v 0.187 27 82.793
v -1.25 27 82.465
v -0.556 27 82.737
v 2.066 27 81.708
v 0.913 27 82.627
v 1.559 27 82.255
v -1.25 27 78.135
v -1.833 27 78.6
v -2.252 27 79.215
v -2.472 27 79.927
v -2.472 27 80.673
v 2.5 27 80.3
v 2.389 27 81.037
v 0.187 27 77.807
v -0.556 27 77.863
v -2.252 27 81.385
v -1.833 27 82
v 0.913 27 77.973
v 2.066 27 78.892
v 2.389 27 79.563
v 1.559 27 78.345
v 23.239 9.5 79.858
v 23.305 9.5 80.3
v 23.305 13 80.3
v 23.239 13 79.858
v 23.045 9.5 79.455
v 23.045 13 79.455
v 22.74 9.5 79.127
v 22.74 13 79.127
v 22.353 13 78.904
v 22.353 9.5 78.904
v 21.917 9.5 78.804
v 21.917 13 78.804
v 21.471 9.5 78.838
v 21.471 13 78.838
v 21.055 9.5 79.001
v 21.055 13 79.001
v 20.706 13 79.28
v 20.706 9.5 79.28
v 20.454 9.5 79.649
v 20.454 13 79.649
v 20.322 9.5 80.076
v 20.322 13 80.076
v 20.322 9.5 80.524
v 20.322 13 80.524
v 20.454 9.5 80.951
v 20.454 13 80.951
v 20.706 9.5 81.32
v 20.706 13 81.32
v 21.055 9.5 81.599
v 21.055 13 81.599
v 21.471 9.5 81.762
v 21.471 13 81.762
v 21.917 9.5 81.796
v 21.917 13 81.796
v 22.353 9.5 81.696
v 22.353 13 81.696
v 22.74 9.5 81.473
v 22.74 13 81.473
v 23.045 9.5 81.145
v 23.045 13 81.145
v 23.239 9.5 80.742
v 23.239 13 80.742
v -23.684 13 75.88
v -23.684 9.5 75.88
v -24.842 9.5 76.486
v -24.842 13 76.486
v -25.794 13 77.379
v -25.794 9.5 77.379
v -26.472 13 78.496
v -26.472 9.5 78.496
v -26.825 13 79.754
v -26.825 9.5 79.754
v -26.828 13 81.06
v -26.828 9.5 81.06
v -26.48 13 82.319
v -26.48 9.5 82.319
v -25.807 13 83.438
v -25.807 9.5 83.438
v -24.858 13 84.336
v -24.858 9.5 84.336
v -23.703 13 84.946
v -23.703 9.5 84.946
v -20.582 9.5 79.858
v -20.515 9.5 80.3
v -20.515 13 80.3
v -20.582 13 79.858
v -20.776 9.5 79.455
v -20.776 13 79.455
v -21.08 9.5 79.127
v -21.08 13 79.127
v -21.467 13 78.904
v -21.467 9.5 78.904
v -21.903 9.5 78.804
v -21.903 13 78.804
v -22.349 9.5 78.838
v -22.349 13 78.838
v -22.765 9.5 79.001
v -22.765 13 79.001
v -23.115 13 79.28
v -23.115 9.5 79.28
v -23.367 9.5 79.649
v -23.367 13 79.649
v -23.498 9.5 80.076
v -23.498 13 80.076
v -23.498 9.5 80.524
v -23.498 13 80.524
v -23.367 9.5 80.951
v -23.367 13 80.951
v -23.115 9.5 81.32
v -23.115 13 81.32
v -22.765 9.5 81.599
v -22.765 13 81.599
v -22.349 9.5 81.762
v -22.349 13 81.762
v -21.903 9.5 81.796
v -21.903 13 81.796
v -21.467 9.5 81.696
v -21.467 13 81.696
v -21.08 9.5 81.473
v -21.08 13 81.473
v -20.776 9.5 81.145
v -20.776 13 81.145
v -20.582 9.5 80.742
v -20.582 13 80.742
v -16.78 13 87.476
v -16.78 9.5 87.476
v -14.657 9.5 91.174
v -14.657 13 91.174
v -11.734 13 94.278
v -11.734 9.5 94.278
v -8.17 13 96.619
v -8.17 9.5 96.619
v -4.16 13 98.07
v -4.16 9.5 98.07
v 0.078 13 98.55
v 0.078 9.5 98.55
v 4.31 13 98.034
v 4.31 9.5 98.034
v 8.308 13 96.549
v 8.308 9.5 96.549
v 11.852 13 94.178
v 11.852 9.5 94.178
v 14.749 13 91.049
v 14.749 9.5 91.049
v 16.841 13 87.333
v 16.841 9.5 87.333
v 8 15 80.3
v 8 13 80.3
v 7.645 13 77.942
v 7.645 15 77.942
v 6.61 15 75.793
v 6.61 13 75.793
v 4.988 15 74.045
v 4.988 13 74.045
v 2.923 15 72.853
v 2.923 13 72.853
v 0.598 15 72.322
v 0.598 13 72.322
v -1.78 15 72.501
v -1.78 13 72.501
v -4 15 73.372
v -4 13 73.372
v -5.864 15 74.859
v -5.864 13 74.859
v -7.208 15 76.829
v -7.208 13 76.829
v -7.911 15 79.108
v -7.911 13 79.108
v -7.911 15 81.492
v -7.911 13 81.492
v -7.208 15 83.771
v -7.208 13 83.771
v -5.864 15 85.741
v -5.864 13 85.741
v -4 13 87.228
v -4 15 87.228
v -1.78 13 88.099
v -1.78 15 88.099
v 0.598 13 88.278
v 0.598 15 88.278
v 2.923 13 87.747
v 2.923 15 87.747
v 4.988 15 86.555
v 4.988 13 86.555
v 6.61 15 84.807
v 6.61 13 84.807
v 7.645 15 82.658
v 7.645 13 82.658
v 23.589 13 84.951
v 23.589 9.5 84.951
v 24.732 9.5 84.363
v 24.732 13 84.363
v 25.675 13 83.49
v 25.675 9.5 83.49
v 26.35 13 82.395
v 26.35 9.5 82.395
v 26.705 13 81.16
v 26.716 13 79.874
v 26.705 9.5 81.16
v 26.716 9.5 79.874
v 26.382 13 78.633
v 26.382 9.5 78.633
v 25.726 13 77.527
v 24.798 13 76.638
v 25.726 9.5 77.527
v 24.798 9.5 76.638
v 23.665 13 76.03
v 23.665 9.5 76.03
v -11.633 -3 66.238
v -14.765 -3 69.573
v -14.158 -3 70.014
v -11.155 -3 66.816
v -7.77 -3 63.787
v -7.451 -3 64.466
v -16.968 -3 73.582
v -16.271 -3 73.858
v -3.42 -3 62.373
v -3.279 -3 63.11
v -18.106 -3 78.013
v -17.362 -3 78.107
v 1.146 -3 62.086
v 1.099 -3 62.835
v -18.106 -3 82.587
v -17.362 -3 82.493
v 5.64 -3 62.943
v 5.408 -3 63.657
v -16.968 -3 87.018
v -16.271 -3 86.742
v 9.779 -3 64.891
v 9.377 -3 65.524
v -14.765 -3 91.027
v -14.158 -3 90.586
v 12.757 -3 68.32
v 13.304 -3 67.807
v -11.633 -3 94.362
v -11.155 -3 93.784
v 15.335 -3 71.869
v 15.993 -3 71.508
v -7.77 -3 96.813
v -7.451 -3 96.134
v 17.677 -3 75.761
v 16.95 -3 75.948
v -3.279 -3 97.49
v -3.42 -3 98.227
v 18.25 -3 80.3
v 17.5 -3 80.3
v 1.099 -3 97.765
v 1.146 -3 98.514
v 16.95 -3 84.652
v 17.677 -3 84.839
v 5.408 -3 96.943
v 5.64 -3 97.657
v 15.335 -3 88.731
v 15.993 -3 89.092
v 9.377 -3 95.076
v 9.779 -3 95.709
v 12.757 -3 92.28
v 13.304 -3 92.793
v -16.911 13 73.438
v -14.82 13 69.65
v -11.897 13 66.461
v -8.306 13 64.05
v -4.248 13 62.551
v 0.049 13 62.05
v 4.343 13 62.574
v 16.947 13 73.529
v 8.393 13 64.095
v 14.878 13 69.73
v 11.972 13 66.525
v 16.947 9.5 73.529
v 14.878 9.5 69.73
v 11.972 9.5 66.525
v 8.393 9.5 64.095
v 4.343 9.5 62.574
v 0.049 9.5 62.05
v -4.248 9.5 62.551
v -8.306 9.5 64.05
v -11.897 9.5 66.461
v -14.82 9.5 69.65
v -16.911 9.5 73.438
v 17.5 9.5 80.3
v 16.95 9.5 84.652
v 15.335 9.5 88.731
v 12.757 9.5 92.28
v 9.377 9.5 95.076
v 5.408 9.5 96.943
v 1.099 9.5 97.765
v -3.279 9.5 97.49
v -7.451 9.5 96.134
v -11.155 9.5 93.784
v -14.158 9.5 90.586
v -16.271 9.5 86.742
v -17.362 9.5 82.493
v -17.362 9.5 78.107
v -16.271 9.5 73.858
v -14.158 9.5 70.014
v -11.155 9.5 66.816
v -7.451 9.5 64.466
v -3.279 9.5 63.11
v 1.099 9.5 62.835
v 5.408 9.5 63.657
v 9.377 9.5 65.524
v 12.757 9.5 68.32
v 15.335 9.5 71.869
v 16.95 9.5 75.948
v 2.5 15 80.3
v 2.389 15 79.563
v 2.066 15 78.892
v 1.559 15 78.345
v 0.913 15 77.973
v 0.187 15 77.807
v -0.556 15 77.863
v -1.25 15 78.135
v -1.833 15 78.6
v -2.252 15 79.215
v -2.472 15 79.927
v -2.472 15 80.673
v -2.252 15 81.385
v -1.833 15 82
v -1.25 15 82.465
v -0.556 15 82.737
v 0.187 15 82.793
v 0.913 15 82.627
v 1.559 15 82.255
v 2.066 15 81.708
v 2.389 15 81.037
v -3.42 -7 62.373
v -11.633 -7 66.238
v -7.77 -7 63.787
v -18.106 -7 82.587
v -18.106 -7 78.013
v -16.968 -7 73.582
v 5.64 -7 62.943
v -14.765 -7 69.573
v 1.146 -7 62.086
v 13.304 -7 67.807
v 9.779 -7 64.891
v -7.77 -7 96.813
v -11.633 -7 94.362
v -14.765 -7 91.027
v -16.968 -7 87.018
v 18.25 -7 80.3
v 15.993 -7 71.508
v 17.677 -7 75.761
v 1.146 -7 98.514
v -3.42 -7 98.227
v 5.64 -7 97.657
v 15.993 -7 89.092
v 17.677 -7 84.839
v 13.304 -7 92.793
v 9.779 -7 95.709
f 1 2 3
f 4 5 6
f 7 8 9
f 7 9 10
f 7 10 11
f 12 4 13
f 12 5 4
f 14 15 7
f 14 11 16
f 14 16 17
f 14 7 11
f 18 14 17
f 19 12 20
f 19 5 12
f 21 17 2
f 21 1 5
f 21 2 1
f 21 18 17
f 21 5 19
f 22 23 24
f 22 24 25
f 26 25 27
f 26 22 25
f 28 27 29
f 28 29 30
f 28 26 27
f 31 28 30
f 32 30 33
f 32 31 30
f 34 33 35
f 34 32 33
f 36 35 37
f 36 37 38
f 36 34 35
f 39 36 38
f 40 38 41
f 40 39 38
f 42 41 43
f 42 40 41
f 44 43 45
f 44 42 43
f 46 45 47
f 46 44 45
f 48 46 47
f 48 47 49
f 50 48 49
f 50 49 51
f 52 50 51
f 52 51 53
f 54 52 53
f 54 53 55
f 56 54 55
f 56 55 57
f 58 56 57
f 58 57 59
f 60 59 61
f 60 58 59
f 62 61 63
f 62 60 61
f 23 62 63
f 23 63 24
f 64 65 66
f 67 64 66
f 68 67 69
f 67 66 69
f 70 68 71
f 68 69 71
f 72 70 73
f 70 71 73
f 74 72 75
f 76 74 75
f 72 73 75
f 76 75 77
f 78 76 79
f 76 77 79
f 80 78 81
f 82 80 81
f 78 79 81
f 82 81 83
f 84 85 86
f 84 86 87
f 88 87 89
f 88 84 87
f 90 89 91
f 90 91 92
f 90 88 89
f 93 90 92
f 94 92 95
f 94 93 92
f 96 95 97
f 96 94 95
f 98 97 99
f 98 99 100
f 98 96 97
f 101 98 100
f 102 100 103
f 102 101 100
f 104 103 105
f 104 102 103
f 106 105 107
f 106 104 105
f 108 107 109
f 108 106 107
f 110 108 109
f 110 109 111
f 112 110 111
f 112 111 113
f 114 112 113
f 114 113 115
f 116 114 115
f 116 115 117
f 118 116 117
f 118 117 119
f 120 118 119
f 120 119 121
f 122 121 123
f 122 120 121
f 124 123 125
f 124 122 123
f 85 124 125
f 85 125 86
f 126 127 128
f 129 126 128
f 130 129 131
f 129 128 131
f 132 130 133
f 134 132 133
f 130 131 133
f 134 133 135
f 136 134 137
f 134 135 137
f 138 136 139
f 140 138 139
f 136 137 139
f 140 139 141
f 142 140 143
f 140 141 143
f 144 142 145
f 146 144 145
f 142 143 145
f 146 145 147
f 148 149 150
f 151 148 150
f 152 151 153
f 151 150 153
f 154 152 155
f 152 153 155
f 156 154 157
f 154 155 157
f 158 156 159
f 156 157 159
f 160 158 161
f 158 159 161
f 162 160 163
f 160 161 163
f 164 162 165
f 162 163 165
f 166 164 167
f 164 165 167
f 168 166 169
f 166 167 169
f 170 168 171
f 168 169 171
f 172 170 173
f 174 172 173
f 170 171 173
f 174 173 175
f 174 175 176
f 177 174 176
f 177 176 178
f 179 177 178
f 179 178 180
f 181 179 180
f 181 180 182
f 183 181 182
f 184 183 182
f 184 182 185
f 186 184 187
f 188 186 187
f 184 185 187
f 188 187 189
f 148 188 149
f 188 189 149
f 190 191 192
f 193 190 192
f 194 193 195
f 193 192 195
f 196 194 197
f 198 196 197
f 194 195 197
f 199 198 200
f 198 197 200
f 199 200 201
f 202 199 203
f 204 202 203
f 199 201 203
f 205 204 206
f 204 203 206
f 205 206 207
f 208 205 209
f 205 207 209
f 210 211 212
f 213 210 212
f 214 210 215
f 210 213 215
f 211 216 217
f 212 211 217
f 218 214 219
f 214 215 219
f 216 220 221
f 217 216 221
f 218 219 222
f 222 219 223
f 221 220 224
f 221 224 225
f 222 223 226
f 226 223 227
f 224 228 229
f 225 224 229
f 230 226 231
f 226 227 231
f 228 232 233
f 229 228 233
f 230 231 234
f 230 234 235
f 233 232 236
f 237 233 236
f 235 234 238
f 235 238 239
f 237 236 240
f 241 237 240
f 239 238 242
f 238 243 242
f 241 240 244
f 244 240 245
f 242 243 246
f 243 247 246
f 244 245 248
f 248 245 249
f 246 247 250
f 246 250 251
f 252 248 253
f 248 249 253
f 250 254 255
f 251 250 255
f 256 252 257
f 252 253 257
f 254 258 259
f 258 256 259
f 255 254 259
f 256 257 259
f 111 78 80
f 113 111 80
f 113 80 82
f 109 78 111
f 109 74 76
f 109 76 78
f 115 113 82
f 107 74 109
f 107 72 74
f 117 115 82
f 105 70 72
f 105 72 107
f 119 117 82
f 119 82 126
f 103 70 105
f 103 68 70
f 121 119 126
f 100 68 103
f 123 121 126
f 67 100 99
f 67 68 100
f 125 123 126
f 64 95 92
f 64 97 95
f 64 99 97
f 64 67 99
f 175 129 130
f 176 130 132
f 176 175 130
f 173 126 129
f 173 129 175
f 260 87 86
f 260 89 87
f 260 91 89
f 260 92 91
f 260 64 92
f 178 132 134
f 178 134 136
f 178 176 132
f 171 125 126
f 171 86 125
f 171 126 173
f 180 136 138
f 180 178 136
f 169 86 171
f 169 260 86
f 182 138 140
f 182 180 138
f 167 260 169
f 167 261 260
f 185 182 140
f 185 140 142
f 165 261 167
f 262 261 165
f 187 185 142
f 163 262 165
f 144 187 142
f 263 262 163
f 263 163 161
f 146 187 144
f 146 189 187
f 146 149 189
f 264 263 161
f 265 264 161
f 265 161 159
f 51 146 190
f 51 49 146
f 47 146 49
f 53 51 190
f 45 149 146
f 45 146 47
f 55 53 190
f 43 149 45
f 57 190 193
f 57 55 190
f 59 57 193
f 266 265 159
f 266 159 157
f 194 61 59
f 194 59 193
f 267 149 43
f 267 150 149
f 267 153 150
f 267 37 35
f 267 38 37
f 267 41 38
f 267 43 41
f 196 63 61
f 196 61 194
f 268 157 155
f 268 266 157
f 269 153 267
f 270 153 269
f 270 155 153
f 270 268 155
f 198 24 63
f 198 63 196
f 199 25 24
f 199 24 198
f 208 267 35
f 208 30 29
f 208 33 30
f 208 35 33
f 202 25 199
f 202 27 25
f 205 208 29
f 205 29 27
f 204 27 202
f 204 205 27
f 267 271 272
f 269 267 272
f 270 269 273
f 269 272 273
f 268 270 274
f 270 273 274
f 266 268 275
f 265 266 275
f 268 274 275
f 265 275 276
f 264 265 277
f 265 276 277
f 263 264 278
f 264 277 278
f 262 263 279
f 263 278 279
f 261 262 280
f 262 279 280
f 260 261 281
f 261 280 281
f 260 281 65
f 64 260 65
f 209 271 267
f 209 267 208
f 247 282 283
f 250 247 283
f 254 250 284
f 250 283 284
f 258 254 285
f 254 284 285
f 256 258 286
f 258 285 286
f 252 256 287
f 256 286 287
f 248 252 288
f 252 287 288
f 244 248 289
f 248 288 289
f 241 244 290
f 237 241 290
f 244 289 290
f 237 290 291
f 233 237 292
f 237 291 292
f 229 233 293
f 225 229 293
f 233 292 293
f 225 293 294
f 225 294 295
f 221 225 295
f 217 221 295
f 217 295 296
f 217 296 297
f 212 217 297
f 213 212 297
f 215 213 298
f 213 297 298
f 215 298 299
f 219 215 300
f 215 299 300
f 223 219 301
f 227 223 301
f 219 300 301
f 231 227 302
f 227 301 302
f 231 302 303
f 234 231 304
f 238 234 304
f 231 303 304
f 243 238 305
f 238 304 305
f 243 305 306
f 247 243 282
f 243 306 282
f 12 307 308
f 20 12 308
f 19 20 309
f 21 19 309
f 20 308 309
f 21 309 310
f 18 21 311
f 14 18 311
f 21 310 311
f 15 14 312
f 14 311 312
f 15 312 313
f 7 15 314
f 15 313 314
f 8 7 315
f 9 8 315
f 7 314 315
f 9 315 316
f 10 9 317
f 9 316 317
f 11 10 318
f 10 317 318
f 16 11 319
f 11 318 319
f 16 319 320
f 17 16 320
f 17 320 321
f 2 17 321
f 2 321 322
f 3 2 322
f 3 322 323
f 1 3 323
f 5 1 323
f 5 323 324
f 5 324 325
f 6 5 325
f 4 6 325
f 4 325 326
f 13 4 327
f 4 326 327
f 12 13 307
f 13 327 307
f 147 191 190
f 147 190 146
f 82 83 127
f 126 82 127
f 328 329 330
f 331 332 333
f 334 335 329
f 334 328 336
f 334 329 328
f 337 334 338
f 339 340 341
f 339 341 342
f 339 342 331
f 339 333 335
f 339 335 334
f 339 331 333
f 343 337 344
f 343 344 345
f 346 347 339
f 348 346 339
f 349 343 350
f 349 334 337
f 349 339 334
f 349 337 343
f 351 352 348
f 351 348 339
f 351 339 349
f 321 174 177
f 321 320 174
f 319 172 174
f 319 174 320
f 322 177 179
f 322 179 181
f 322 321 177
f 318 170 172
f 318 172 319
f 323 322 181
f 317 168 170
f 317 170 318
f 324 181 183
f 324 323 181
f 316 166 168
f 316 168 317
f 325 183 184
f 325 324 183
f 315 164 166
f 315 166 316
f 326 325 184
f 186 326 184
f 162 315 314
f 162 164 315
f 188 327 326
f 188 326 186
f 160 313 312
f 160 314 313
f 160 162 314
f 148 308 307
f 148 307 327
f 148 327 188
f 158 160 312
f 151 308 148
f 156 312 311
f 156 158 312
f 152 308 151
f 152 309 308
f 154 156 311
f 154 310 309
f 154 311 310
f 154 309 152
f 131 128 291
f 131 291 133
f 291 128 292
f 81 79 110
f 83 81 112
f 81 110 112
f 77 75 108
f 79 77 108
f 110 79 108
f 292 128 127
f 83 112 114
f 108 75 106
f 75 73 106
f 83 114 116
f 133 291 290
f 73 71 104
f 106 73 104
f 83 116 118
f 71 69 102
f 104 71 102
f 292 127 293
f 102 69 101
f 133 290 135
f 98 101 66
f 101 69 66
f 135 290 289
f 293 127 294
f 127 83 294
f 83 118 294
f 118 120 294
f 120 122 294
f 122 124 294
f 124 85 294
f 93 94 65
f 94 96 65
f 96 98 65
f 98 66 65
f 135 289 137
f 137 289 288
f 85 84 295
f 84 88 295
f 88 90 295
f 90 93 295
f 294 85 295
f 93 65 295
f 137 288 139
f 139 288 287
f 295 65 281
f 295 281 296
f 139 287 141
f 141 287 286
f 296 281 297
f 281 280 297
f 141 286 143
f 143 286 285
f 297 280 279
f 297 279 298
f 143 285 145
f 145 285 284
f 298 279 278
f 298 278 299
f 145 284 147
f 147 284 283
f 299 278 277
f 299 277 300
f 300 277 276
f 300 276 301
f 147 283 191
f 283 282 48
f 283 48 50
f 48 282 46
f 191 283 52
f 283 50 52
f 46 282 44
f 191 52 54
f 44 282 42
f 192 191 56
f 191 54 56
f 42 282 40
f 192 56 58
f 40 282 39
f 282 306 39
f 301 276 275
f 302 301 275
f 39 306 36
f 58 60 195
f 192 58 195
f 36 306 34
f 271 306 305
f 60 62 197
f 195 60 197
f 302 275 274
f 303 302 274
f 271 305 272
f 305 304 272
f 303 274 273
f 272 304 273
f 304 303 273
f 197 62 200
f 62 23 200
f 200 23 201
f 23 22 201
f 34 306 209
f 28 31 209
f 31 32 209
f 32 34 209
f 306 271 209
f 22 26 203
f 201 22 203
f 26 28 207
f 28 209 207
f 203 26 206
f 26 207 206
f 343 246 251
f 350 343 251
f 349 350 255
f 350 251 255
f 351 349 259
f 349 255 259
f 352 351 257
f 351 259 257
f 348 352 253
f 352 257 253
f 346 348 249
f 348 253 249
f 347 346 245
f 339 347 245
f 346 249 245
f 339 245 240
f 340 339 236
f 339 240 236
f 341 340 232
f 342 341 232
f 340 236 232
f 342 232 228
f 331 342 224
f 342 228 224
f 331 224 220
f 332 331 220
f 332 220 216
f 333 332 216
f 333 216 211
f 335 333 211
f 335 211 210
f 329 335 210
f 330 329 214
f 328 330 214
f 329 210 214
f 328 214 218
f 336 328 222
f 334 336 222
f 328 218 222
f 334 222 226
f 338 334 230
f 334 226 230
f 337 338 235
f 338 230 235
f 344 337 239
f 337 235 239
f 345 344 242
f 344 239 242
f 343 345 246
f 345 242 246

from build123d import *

# Parameters (mm, degrees)
SKETCH051_R             = 1.5
PAD022_DEPTH            = 3.5
SKETCH052_R             = 17.5
PAD003_DEPTH            = 12.5
SKETCH053_R             = 18.25
PAD004_DEPTH            = 4
SKETCH005_R             = 8
PAD023_DEPTH            = 2
SKETCH006_R             = 2.5
PAD021_DEPTH            = 12
BODY024_PLACEMENT_ANGLE = 90


with BuildPart() as part:
    # Sketch051 → Pad022 (new body)
    with BuildSketch(Plane.XY):
        with BuildLine():
            ThreePointArc((-16.780137, -7.175619), (0.077574, -18.249835), (16.840532, -7.032709))
            Line((23.588818, -4.651296), (16.840532, -7.032709))
            ThreePointArc((23.588818, -4.651296), (26.754582, -0.217457), (23.665308, 4.270011))
            Line((16.947438, 6.77103), (23.665308, 4.270011))
            ThreePointArc((16.947438, 6.77103), (0.049146, 18.249934), (-16.910725, 6.862207))
            Line((-16.910725, 6.862207), (-23.684267, 4.419805))
            ThreePointArc((-23.684267, 4.419805), (-26.870918, -0.10661), (-23.703302, -4.646365))
            Line((-23.703302, -4.646365), (-16.780137, -7.175619))
        make_face()
        with Locations((-22.015205, 0)):
            Circle(SKETCH051_R, mode=Mode.SUBTRACT)
        with Locations((21.805187, 0)):
            Circle(SKETCH051_R, mode=Mode.SUBTRACT)
    extrude(amount=PAD022_DEPTH)

    # Sketch052 (on Face11 of Pad022) → Pad003 (join)
    with BuildSketch(Plane(origin=(0, 0, 0), x_dir=(1, 0, 0), z_dir=(0, 0, -1))):
        Circle(SKETCH052_R)
    extrude(amount=PAD003_DEPTH)

    # Sketch053 (on Face14 of Pad003) → Pad004 (join)
    with BuildSketch(Plane(origin=(0, 0, -12.5), x_dir=(1, 0, 0), z_dir=(0, 0, -1))):
        Circle(SKETCH053_R)
    extrude(amount=PAD004_DEPTH)

    # Sketch005 (on Face16 of Pad004) → Pad023 (join)
    with BuildSketch(Plane.XY.offset(3.5)):
        Circle(SKETCH005_R)
    extrude(amount=PAD023_DEPTH)

    # Sketch006 (on Face18 of Pad023) → Pad021 (join)
    with BuildSketch(Plane.XY.offset(5.5)):
        Circle(SKETCH006_R)
    extrude(amount=PAD021_DEPTH)


with BuildPart() as part_1:
    # Body024 placement: moved
    add(part.part.moved(Location((0, 9.5, 80.3))).rotate(Axis((0, 9.5, 80.3), (-1, 0, 0)), BODY024_PLACEMENT_ANGLE))


solid = part_1.part
